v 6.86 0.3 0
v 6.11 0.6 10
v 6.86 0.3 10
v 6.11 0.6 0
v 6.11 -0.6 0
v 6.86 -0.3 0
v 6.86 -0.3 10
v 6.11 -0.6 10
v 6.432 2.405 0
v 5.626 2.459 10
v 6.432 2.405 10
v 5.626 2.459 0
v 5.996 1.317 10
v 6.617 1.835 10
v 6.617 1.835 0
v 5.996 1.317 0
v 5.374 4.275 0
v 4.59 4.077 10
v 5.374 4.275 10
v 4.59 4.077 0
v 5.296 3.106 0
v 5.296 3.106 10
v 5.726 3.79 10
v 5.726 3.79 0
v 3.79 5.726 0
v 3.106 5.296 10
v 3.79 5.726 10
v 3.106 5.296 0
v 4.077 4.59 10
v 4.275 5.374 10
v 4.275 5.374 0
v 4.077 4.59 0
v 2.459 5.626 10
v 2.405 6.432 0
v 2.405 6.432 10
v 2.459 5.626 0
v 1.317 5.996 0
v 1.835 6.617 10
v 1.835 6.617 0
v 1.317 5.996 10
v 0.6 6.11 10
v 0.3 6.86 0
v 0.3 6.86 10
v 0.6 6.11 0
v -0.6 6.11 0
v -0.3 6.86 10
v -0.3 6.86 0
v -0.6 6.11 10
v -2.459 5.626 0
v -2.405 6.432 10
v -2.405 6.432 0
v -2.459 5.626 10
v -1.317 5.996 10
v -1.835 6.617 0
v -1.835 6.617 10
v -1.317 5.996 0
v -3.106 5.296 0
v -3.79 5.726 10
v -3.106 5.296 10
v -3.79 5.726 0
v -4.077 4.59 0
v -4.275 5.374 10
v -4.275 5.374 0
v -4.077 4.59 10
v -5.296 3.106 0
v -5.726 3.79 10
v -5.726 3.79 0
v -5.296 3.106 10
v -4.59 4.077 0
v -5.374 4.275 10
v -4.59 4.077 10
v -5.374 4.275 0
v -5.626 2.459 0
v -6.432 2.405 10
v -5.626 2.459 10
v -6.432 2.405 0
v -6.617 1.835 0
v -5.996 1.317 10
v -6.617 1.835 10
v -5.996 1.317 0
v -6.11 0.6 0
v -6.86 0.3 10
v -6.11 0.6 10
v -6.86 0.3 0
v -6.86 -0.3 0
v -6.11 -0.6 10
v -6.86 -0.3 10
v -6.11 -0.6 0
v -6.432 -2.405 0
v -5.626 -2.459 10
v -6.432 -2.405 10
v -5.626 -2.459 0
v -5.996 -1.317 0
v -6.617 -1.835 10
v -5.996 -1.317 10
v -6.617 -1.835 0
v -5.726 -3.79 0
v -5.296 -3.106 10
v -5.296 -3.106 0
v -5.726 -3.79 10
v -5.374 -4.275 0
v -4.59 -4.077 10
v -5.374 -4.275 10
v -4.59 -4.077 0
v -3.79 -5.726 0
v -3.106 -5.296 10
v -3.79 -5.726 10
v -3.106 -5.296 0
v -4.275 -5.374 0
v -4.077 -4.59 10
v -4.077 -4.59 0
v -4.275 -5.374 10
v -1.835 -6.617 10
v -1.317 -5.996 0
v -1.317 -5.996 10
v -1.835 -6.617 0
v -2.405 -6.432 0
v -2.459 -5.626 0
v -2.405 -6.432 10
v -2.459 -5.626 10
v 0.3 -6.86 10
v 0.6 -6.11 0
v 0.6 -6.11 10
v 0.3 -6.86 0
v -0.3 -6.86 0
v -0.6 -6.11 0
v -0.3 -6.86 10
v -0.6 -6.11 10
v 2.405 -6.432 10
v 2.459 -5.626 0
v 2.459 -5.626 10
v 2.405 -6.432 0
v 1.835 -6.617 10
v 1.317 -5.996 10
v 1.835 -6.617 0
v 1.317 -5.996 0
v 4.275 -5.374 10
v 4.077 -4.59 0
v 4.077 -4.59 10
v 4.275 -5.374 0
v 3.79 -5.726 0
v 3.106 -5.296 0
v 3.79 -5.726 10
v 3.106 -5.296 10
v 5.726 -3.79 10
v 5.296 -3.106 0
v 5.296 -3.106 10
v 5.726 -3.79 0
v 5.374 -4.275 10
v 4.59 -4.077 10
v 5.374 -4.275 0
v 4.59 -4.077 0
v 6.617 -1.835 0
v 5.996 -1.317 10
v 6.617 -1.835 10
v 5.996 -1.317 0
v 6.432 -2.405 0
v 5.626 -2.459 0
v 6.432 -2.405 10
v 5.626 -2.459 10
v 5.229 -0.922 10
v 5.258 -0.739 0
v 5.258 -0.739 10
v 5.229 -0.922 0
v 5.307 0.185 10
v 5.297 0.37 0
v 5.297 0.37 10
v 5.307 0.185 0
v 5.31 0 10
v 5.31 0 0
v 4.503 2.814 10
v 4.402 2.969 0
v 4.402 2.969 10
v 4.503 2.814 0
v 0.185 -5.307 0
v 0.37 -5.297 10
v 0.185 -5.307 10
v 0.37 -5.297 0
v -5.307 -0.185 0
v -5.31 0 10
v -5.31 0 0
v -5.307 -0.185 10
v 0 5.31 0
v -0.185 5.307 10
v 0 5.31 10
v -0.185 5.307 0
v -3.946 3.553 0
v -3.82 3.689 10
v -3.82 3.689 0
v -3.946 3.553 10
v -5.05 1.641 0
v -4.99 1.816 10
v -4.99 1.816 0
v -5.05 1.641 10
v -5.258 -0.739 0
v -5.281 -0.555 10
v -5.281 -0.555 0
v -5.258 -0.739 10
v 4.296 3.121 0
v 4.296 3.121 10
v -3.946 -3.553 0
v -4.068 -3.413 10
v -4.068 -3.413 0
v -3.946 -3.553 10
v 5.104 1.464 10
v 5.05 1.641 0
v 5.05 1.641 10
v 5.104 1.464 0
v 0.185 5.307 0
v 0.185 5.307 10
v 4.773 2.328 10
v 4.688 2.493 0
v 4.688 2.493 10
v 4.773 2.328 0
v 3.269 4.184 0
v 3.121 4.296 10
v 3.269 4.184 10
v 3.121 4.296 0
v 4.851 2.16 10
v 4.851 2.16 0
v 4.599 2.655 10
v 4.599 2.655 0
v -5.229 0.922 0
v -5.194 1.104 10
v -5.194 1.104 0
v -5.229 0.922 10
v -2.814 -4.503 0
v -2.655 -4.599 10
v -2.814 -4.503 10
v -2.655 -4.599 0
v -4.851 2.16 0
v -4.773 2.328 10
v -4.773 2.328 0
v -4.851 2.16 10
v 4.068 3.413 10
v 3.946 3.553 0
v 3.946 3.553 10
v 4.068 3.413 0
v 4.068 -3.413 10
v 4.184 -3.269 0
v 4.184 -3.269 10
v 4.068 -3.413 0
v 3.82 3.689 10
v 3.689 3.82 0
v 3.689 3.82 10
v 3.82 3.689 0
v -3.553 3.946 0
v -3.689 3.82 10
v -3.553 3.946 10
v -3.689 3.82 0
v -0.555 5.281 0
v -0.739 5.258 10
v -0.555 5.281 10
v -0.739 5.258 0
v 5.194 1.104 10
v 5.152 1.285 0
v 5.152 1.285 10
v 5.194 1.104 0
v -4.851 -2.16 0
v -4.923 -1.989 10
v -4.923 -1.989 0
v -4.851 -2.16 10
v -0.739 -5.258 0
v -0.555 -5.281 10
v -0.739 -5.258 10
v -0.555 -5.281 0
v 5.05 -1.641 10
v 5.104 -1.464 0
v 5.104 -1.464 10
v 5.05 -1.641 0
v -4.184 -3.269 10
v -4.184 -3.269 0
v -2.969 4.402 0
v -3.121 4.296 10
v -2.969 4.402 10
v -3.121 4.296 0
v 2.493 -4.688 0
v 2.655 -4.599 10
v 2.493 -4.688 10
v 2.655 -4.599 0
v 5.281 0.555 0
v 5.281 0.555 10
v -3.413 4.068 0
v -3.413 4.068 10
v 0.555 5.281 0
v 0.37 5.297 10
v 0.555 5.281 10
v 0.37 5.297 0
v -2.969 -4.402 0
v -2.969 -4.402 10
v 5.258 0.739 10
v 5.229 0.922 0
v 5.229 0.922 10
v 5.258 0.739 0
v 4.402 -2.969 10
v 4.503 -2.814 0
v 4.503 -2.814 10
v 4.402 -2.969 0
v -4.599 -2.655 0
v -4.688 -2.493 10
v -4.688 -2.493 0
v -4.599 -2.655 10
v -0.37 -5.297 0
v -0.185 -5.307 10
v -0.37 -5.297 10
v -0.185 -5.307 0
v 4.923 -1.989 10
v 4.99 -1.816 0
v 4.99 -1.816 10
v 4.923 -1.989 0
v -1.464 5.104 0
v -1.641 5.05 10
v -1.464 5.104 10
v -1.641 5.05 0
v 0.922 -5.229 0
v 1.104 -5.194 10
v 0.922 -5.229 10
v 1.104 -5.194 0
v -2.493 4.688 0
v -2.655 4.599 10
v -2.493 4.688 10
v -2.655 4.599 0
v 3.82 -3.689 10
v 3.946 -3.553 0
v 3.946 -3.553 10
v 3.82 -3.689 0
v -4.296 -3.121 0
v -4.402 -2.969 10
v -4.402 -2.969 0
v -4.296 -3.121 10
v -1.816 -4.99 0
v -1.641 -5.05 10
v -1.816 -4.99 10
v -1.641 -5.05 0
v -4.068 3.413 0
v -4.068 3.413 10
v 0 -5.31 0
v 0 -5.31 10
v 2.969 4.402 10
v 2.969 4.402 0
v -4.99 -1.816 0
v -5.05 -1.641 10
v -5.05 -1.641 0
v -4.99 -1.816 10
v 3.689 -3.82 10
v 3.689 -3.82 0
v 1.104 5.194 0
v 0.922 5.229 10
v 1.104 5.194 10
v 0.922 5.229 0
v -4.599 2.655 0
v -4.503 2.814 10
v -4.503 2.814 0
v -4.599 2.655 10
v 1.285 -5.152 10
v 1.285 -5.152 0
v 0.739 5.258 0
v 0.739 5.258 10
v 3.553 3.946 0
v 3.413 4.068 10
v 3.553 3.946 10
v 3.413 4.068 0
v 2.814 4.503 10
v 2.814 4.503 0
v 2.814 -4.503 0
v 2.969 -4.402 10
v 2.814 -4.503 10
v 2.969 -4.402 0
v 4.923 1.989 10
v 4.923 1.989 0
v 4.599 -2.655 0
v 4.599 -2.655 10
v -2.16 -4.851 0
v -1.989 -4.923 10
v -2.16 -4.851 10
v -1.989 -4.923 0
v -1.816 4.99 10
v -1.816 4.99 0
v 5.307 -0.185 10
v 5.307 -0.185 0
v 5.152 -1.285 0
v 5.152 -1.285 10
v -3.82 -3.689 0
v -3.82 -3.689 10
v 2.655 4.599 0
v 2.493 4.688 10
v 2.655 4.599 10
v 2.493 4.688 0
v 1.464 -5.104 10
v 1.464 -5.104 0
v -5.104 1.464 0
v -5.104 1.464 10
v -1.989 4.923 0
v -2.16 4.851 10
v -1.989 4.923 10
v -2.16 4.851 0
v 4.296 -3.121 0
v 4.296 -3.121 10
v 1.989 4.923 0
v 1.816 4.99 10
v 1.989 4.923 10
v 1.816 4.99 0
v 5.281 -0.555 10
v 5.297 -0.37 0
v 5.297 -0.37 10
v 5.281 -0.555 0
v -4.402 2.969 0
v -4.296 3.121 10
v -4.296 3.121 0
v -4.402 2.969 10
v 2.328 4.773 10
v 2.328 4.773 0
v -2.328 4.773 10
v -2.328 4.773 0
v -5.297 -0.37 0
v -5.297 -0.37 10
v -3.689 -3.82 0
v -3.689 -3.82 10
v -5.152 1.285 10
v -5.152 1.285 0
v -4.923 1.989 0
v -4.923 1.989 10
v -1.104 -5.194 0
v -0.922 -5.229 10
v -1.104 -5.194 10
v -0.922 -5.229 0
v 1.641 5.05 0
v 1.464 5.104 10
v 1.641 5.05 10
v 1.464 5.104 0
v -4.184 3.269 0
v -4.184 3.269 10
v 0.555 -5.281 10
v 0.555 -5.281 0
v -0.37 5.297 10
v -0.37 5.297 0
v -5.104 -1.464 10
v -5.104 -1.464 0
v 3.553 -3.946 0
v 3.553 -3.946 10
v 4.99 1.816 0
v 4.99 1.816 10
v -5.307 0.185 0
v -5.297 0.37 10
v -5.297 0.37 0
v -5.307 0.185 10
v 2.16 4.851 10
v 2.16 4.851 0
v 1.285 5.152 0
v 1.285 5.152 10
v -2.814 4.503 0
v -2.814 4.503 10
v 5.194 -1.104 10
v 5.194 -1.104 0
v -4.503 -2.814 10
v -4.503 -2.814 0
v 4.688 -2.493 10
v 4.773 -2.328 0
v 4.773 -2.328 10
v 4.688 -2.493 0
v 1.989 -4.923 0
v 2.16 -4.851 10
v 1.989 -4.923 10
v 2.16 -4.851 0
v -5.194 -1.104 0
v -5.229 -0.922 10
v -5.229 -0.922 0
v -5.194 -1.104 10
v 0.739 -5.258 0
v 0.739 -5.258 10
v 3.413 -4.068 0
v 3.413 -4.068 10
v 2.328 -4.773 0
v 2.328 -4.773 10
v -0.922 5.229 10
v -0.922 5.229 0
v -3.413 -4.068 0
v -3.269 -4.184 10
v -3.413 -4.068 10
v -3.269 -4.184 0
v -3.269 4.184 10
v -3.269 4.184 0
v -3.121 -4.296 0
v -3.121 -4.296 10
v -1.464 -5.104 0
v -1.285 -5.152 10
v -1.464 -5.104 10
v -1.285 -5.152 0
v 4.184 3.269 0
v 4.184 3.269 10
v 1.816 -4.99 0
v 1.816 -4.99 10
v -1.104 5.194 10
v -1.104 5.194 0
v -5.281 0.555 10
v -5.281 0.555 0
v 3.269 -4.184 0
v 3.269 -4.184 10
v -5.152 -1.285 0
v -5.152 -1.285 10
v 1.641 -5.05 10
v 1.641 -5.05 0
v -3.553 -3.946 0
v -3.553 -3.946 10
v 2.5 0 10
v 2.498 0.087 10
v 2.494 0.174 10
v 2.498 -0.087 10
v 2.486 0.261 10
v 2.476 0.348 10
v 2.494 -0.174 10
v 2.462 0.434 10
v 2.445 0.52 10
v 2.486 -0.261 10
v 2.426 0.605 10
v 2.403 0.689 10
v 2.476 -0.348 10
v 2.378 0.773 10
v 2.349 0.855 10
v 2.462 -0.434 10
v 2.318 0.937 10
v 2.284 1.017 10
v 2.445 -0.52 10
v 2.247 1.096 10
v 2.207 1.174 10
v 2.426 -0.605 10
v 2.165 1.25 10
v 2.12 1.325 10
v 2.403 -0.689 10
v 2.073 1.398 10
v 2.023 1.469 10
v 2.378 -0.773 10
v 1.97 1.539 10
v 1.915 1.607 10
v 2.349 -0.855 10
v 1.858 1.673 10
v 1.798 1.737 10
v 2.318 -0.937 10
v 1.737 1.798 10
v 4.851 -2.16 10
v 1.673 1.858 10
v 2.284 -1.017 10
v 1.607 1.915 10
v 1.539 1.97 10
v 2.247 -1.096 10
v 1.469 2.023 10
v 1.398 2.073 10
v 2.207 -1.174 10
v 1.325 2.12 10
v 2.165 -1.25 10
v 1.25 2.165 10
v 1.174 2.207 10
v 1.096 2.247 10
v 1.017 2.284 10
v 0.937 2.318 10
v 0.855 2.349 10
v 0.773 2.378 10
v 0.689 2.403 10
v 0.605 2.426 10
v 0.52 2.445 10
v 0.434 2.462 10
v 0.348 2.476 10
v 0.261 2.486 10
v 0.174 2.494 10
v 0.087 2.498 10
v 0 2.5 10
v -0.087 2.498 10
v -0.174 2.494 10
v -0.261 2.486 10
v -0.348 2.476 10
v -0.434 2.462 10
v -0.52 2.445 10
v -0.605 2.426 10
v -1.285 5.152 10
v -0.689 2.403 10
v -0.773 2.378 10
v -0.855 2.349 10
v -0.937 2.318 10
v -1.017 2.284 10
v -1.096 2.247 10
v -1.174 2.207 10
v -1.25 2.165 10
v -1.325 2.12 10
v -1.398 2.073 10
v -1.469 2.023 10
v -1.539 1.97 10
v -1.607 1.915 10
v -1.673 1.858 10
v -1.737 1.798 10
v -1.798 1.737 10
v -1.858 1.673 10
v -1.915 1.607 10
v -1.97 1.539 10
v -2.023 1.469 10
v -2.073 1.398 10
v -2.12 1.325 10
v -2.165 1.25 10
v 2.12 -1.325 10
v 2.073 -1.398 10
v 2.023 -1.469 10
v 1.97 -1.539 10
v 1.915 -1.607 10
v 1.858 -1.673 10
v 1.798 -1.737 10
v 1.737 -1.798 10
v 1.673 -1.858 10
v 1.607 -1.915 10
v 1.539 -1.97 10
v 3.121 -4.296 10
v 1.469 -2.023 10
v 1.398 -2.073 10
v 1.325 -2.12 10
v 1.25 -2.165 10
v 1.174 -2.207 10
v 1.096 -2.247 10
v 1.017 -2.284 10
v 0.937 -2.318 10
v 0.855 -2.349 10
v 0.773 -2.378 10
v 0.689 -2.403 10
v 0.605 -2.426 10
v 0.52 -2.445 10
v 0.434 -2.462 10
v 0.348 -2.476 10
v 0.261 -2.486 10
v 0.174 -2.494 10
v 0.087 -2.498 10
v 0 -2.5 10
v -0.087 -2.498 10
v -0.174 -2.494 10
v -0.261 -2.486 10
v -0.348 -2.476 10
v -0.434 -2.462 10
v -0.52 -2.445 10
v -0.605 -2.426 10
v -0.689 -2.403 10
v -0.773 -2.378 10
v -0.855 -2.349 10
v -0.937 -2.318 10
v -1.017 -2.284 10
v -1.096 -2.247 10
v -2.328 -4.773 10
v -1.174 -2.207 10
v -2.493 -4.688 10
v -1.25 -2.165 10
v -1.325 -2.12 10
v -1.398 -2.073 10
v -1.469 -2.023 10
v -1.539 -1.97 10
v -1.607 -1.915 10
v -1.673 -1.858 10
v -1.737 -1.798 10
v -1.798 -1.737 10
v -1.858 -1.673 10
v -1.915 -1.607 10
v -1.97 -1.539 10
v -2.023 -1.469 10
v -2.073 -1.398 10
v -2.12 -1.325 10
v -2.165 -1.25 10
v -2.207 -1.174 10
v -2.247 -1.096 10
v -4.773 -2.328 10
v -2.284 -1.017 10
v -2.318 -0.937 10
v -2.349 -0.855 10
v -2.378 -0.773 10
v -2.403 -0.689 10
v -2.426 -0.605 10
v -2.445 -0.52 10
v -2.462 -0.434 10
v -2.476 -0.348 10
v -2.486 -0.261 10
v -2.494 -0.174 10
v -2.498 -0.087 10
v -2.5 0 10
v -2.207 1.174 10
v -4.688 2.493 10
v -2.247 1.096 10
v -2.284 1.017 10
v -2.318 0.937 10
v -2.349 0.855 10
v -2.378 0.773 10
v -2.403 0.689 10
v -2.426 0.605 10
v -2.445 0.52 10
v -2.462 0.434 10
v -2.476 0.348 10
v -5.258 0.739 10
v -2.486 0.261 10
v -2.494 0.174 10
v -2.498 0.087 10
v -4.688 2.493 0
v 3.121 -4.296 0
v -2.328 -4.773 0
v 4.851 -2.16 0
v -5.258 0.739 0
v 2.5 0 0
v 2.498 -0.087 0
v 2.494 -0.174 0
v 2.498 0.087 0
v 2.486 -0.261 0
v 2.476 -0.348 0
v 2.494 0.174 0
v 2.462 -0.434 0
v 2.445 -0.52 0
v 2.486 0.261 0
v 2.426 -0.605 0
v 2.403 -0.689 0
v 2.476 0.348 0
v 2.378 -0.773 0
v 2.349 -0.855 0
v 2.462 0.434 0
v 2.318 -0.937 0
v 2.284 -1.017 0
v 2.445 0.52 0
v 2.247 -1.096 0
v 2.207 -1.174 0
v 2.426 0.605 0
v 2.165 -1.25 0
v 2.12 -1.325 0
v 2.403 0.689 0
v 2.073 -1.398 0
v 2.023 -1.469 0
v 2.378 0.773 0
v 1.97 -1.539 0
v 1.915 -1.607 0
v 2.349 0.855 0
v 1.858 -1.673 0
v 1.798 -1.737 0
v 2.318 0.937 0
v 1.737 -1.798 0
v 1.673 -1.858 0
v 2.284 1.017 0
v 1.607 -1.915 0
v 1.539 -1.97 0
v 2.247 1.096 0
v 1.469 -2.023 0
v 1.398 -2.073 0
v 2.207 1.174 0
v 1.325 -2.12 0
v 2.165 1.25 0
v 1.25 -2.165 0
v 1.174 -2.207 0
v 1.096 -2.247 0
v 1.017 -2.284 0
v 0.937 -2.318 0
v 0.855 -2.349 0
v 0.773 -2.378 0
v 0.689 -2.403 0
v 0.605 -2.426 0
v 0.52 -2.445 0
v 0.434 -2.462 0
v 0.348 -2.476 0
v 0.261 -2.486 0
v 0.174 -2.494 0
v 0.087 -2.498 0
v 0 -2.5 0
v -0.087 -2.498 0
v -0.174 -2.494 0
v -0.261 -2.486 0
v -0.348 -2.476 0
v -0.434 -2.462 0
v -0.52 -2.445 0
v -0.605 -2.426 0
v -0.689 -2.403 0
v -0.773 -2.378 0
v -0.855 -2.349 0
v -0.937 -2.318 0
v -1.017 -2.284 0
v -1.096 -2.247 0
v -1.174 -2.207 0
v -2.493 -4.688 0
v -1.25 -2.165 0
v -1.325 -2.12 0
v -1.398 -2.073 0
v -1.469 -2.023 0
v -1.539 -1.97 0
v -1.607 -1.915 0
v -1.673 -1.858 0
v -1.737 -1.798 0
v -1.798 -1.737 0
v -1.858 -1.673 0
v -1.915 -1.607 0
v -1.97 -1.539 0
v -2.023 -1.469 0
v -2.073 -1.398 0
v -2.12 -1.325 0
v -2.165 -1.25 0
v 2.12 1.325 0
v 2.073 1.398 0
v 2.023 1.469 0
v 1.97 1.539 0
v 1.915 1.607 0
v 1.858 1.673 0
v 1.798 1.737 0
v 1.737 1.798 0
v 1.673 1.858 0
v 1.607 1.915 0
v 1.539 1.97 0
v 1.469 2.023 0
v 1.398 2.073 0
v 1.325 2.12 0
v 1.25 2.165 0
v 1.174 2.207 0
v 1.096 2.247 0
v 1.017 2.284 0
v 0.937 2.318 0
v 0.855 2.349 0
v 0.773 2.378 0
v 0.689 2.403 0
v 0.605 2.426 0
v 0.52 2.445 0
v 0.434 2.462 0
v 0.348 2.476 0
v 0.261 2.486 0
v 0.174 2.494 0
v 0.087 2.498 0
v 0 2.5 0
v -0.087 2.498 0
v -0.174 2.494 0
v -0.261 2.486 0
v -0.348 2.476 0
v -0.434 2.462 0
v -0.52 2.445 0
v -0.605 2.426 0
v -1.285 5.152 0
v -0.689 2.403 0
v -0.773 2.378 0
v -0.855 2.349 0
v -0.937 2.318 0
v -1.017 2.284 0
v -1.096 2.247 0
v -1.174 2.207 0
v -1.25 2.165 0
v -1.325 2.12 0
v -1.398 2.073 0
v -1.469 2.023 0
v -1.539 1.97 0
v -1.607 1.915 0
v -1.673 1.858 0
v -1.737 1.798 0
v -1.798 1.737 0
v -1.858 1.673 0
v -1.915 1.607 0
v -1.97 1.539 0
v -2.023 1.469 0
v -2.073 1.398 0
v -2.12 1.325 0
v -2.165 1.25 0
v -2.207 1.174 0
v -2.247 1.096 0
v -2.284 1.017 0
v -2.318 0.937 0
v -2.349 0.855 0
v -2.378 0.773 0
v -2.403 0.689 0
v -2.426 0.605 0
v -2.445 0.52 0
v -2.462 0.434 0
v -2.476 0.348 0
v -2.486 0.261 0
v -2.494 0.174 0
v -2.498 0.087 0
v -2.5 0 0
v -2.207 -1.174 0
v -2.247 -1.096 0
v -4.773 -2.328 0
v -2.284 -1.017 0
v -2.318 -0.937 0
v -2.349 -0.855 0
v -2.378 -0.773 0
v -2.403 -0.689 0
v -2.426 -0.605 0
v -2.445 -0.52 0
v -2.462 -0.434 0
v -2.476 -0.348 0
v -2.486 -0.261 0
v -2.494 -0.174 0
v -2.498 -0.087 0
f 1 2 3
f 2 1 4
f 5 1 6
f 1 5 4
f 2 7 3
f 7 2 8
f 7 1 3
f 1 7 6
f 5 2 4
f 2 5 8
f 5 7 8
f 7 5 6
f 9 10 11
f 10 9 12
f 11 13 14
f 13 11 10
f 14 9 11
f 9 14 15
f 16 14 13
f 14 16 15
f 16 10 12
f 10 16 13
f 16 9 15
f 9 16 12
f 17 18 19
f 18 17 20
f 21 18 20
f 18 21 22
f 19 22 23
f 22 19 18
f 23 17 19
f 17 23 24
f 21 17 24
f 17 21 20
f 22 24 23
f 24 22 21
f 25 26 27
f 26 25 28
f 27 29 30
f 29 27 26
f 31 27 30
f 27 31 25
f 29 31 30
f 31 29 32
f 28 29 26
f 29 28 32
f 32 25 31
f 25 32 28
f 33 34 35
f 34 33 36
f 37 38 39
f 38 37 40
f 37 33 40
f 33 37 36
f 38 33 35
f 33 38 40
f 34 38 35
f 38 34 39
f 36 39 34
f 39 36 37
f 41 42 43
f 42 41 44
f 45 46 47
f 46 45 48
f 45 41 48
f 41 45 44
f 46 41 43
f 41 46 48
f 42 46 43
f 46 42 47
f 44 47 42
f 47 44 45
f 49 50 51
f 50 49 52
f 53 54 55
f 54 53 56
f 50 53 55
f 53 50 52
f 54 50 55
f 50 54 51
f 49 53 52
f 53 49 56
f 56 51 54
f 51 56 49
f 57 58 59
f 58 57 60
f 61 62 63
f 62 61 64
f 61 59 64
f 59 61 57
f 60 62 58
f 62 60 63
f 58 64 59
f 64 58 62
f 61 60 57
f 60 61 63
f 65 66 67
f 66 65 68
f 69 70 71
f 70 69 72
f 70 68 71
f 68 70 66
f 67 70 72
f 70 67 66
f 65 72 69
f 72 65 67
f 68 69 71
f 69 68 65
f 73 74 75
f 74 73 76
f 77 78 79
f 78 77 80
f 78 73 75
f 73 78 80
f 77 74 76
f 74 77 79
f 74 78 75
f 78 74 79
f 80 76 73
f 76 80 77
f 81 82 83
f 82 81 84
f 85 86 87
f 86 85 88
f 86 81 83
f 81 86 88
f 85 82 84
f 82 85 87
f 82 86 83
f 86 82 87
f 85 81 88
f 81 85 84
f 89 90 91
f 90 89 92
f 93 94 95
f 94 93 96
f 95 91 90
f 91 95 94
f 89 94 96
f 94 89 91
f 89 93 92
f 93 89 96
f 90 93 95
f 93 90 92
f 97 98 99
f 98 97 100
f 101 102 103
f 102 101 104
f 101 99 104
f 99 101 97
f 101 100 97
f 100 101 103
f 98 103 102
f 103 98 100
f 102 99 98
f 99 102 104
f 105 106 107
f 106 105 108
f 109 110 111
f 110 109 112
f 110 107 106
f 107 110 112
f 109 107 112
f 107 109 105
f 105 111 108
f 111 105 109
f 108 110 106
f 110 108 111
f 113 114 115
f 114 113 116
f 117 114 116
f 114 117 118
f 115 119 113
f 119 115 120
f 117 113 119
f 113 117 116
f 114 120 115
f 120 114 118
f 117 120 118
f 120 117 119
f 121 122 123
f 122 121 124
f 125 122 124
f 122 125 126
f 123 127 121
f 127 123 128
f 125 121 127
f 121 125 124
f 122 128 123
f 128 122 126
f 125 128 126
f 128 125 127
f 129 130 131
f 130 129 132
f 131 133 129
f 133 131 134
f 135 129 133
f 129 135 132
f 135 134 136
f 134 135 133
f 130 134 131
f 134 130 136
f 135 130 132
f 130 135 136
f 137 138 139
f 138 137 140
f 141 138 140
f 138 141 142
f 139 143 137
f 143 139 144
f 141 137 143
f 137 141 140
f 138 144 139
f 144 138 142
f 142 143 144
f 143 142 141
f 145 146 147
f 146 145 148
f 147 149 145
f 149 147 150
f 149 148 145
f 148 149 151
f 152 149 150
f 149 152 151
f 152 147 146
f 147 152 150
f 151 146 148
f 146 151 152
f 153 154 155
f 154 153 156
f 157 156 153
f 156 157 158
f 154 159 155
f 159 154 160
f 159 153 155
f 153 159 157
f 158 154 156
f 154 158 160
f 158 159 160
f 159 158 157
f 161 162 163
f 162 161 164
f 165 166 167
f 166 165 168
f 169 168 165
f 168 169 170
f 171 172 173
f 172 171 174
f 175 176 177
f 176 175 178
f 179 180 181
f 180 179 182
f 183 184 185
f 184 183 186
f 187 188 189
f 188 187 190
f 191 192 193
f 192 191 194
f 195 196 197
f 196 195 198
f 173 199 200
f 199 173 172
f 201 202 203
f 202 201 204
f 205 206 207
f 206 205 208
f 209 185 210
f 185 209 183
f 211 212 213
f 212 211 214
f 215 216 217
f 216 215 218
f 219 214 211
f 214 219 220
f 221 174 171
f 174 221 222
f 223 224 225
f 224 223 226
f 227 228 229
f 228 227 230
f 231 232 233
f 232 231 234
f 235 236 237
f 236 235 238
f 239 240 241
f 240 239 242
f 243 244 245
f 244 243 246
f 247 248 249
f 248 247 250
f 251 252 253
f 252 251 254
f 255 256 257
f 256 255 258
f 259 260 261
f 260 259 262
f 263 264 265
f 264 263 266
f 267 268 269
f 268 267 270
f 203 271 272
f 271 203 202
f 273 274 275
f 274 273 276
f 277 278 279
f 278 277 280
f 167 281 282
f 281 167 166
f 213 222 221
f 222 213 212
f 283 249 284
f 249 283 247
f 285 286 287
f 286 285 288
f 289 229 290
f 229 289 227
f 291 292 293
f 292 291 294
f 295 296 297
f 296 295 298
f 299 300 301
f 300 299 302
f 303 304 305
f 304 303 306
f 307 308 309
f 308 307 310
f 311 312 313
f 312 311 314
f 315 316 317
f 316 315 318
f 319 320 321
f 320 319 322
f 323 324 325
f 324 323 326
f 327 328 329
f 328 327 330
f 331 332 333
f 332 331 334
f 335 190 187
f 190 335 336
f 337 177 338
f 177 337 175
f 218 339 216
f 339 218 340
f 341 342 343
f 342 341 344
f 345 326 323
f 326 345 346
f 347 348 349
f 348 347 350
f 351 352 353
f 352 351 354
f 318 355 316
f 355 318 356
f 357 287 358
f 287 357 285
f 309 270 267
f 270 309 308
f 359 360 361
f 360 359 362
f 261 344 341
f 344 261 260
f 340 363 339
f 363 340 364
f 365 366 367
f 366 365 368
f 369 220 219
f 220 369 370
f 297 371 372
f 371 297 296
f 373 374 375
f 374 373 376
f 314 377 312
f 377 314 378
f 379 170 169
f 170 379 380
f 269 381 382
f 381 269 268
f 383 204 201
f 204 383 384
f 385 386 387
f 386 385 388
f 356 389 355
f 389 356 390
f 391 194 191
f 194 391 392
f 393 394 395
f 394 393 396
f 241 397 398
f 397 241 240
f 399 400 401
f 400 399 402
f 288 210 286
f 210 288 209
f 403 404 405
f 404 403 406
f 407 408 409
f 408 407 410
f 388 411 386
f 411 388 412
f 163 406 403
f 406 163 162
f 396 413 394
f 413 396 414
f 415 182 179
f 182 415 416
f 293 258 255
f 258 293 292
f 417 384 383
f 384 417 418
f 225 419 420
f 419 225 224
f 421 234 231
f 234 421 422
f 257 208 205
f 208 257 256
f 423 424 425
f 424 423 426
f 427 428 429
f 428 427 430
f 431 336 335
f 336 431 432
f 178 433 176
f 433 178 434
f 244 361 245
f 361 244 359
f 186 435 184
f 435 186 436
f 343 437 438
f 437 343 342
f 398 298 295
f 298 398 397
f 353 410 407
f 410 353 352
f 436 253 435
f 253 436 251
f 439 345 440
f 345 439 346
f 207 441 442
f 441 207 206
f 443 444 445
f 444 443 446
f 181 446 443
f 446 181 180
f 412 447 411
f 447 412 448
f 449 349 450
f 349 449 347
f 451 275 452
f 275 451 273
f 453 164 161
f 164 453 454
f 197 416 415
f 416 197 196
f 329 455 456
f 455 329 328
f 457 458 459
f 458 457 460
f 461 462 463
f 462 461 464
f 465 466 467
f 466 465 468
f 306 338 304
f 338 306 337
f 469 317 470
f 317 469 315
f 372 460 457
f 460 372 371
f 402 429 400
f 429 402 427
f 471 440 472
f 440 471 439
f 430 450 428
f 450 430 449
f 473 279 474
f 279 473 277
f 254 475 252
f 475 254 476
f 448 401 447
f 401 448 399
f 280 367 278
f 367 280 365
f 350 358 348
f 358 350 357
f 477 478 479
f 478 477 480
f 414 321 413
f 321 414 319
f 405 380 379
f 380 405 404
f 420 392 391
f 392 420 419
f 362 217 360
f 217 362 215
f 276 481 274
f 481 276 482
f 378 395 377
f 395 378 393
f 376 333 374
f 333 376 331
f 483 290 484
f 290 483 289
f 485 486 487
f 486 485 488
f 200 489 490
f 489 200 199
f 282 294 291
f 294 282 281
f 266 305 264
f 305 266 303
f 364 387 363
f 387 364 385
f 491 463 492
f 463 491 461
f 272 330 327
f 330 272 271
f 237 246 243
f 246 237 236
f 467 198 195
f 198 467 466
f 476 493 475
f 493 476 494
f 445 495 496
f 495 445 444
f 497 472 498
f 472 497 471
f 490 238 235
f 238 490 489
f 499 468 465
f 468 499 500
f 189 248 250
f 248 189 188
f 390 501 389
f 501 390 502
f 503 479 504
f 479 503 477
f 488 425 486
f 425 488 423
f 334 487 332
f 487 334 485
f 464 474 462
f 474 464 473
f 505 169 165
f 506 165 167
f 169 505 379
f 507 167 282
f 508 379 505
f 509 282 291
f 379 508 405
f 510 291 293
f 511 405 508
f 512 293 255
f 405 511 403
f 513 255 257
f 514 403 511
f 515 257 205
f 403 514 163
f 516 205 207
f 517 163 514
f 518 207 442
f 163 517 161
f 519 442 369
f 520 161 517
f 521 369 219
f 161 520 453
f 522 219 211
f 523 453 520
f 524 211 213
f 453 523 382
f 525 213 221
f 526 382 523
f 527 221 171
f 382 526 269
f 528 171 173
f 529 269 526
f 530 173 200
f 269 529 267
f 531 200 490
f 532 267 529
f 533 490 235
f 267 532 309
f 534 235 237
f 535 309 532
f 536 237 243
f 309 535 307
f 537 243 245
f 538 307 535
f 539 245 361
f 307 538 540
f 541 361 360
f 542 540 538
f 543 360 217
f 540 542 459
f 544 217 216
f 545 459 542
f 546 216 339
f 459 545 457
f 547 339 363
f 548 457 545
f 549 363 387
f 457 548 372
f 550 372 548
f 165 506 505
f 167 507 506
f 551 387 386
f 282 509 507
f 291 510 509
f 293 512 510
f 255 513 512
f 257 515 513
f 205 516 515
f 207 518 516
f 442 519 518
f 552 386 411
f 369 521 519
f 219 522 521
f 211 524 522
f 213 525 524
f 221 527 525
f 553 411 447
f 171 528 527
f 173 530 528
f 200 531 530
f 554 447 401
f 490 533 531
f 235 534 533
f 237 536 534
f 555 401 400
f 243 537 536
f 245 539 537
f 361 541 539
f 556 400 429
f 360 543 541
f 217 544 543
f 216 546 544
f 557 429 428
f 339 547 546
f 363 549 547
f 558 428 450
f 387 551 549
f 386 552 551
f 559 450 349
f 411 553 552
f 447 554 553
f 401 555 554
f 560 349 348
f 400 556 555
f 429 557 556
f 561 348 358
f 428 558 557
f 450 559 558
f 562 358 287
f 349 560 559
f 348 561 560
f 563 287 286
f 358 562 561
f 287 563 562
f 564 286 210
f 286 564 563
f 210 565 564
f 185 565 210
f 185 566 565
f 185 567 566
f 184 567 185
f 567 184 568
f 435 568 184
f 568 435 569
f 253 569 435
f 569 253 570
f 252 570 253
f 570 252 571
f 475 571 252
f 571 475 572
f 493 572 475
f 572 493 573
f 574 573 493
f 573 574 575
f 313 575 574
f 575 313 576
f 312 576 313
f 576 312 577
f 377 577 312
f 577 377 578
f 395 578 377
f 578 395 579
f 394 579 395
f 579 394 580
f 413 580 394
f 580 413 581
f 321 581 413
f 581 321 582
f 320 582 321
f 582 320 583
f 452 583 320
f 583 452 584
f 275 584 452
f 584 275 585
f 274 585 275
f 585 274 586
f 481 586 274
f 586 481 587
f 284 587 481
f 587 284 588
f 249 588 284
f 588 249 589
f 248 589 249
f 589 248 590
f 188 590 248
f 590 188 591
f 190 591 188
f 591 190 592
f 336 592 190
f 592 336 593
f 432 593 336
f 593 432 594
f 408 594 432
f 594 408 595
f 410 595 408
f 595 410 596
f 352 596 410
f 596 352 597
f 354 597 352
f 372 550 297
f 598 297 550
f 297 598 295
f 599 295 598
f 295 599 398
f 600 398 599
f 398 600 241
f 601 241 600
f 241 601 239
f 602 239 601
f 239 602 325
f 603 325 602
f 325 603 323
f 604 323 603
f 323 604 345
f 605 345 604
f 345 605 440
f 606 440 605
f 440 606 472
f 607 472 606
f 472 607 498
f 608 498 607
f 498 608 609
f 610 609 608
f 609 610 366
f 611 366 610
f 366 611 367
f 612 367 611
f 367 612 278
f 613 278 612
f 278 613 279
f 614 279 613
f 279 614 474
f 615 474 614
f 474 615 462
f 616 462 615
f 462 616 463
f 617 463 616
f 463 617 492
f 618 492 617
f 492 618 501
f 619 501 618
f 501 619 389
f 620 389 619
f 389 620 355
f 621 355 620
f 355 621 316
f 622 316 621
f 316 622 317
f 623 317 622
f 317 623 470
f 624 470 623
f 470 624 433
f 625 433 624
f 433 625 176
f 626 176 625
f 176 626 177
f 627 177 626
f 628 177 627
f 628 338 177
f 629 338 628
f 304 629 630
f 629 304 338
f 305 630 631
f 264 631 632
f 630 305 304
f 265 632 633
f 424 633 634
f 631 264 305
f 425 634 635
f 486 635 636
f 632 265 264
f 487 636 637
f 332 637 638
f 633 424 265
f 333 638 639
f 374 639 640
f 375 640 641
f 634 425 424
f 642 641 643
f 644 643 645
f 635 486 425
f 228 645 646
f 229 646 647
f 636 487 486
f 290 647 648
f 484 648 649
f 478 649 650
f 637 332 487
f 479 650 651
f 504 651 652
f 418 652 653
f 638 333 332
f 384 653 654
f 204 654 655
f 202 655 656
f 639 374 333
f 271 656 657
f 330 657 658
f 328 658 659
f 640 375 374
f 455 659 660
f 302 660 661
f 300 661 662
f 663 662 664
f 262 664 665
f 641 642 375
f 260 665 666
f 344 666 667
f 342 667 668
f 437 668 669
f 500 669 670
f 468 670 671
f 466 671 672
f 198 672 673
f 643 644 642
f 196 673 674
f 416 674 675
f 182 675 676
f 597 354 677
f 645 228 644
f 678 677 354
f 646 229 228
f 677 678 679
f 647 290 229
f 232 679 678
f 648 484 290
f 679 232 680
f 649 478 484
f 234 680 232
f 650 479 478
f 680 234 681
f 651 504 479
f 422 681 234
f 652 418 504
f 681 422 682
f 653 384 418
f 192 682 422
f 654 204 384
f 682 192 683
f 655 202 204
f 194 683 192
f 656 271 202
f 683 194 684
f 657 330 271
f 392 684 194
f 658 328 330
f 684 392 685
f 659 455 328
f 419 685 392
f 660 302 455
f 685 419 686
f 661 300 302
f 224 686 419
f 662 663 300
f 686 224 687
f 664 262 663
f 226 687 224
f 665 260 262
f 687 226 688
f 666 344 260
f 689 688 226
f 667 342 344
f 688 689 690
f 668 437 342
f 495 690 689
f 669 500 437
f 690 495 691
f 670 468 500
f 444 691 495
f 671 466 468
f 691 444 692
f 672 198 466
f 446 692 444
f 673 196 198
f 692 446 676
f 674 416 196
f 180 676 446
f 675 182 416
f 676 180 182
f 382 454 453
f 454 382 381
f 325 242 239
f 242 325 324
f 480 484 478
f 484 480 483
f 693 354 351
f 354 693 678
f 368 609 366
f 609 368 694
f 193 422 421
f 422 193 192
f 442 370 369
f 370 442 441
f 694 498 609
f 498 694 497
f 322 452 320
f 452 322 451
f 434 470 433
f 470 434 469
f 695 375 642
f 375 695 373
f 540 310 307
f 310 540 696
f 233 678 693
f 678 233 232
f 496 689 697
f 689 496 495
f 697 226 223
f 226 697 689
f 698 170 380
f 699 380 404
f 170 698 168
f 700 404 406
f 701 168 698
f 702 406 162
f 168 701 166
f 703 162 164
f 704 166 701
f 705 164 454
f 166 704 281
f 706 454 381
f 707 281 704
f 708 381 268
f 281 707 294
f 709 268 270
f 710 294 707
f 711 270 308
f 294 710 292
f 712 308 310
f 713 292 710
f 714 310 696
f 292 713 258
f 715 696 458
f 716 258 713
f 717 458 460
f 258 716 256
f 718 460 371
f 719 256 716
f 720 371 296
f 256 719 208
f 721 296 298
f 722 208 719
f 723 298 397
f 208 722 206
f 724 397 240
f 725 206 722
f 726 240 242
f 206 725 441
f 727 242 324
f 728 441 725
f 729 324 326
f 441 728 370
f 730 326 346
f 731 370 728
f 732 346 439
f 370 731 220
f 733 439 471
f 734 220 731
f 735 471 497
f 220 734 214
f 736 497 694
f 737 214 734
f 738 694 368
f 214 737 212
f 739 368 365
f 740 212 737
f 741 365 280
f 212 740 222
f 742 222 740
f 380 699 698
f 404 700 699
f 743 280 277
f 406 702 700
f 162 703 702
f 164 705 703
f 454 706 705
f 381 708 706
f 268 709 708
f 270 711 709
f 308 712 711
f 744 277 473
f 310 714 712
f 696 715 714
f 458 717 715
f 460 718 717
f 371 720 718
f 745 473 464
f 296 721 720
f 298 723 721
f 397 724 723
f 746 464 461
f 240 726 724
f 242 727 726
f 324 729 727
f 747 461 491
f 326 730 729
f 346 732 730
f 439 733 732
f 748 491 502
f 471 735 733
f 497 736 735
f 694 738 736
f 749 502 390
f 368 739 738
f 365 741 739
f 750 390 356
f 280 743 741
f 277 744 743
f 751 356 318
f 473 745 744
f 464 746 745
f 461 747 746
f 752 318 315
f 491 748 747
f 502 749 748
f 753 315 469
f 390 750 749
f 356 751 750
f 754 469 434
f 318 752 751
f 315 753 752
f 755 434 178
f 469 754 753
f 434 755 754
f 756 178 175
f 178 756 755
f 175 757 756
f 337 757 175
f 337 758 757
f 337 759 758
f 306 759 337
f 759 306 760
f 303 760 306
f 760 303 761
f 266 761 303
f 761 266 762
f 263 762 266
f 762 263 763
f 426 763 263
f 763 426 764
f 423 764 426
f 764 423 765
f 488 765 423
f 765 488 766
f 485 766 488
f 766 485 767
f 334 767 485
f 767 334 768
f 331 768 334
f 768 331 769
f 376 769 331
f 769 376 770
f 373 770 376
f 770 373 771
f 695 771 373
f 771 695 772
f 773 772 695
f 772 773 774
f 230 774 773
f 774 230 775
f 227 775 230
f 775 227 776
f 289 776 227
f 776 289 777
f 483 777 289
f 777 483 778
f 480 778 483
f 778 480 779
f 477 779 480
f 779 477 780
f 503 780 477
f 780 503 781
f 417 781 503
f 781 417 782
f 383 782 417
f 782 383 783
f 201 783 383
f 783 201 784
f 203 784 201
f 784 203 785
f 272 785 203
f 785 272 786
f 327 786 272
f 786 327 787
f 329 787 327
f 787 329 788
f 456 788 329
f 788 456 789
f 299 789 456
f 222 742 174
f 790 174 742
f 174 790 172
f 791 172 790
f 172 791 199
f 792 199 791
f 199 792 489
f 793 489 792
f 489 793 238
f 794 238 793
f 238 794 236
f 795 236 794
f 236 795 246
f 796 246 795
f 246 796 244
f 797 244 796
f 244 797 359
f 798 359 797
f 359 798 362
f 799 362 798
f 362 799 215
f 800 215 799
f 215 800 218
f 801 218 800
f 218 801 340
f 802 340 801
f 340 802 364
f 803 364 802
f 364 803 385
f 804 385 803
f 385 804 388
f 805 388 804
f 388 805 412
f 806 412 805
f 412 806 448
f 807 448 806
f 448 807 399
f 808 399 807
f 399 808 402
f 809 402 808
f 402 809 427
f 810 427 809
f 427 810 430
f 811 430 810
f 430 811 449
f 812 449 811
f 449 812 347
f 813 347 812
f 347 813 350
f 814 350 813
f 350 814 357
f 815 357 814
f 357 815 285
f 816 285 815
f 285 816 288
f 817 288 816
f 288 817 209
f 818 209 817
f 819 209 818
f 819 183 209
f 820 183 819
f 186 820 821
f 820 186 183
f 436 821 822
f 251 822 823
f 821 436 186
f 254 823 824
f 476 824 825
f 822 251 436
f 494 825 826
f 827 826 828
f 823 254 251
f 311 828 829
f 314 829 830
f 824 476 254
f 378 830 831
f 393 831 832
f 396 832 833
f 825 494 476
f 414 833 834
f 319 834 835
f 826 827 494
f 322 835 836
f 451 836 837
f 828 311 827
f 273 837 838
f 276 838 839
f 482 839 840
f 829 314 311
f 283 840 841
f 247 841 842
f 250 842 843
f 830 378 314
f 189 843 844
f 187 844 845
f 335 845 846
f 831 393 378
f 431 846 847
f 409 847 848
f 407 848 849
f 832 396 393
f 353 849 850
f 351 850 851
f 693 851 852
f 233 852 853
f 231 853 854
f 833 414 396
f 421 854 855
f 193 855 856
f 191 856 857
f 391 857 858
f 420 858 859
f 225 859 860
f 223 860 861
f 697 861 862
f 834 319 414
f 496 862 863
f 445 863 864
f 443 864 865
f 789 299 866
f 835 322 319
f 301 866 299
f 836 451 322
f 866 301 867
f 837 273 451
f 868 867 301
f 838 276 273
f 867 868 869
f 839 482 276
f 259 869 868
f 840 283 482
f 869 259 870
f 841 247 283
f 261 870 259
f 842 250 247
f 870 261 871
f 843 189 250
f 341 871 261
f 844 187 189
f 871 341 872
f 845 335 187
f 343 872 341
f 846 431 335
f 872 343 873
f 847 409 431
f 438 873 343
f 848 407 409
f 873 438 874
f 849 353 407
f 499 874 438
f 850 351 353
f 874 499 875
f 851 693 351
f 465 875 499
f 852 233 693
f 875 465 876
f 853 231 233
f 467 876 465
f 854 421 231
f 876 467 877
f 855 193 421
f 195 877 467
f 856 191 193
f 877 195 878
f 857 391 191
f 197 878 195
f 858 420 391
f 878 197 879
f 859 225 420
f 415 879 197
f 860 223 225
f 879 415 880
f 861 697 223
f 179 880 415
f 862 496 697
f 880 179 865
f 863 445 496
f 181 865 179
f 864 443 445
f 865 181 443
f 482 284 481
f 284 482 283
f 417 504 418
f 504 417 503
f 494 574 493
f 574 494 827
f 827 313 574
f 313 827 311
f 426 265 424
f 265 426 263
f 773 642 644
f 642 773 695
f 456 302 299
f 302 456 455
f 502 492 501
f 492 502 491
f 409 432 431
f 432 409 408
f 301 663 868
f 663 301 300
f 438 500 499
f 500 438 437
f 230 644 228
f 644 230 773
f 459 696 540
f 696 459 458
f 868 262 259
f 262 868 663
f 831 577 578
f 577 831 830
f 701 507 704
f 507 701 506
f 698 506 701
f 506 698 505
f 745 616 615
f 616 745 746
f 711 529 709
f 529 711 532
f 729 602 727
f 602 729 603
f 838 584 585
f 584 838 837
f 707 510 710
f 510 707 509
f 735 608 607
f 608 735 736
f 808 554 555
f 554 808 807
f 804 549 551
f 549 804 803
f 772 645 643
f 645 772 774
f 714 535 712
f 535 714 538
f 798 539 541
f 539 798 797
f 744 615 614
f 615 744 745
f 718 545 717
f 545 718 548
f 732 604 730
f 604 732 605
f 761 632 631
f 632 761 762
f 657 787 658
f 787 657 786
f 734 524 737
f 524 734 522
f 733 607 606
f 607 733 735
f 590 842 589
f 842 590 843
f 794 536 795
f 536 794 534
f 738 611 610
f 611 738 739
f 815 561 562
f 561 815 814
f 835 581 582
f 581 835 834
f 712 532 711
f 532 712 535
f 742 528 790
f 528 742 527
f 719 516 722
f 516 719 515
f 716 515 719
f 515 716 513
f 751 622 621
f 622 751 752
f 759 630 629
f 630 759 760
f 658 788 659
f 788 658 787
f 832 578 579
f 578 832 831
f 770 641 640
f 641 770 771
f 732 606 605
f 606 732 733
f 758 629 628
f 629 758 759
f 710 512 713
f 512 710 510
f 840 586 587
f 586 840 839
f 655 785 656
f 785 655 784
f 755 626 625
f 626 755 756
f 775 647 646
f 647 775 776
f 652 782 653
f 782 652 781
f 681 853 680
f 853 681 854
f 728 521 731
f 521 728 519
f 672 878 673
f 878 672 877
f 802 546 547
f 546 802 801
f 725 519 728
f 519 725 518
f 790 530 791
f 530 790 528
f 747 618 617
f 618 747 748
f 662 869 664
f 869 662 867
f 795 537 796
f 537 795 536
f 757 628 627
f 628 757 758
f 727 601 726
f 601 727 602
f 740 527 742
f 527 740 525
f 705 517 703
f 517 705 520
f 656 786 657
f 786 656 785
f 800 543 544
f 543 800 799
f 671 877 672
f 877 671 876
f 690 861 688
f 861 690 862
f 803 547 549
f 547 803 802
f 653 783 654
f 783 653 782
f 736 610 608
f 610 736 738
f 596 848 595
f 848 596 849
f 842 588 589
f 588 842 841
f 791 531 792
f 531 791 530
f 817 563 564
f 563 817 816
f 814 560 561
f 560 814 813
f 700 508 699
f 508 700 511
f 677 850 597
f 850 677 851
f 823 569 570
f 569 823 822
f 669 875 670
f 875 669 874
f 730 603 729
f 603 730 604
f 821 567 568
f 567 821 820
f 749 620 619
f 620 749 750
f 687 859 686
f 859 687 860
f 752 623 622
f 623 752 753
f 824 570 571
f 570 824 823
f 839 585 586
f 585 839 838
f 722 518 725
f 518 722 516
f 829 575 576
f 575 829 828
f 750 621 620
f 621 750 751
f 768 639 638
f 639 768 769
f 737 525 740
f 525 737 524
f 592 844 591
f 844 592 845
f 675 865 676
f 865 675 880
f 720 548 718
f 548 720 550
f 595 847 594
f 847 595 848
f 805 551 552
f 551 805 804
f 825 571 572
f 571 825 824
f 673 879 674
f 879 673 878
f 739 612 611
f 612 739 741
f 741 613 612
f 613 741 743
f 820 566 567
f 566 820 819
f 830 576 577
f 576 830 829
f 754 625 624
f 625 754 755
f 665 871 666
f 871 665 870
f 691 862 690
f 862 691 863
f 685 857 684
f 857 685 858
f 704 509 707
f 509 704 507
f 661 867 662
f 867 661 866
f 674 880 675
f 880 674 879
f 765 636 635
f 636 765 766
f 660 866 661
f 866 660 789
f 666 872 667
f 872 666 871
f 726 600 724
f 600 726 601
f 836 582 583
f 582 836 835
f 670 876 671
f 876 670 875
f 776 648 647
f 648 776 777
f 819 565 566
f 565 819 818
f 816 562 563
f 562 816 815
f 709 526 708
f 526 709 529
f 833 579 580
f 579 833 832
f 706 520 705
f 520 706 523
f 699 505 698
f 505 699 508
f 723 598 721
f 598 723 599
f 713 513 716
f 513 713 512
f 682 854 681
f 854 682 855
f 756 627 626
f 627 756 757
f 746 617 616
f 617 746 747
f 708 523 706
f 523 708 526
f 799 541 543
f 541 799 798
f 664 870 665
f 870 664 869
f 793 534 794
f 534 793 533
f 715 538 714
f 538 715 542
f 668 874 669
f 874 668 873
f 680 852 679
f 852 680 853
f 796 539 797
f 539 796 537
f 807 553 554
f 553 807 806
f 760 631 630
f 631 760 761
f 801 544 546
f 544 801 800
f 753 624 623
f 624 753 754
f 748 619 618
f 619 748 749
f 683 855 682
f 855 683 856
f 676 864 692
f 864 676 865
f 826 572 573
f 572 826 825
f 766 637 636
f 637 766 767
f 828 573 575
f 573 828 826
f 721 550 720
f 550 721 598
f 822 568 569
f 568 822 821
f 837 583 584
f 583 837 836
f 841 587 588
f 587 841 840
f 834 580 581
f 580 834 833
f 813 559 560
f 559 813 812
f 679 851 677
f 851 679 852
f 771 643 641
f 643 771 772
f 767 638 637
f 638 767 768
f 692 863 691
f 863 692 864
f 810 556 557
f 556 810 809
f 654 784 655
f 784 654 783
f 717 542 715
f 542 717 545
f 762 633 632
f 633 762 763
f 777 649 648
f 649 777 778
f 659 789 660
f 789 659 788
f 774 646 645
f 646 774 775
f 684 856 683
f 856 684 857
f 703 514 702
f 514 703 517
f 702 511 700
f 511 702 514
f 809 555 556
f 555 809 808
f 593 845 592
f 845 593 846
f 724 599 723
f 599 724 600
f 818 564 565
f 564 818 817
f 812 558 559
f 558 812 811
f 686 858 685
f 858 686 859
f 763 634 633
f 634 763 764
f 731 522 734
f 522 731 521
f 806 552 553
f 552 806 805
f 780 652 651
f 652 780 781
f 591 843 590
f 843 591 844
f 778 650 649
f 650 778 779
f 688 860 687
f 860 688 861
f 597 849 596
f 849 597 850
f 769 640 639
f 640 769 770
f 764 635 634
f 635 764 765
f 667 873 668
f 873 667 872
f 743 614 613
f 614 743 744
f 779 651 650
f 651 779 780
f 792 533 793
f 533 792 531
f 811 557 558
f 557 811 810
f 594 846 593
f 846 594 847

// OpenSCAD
$fn = 180;

// Timing pulley (simplified GT2-like tooth form)
// User specs:
teeth = 20;
pitch_diameter = 12.22;   // mm

// Assumptions / defaults (can be edited):
pitch = PI * pitch_diameter / teeth;  // derived from pitch diameter & tooth count
pulley_width = 10;        // mm
bore_diameter = 5;        // mm
hub_diameter = 0;         // 0 = no hub
hub_width = 0;            // mm

// Tooth geometry (simplified trapezoid approximation):
tooth_height = 0.75;      // mm (radial)
tooth_top_width = 0.60;   // mm (at outer radius)
tooth_root_width = 1.20;  // mm (at pitch radius)

// Body thickness below pitch circle (to give a root cylinder):
root_extra = 0.80;        // mm (radial below pitch radius)

// Small clearance to avoid coincident faces:
eps = 0.01;

module timing_pulley(teeth, pitch_diameter, width, bore_d, hub_d=0, hub_w=0) {
    pitch_r = pitch_diameter/2;
    root_r  = max(0.1, pitch_r - root_extra);
    outer_r = pitch_r + tooth_height;

    difference() {
        union() {
            // Root cylinder
            cylinder(h=width, r=root_r);

            // Teeth
            for (i = [0:teeth-1]) {
                rotate([0,0, i*360/teeth])
                    translate([pitch_r, 0, 0])
                        tooth(width, tooth_root_width, tooth_top_width, tooth_height);
            }

            // Optional hub
            if (hub_d > 0 && hub_w > 0) {
                translate([0,0,(width-hub_w)/2])
                    cylinder(h=hub_w, r=hub_d/2);
            }
        }

        // Bore
        translate([0,0,-eps])
            cylinder(h=width + 2*eps, r=bore_d/2);
    }
}

module tooth(width, w_root, w_top, h) {
    // Trapezoid in XY, extruded along Z
    linear_extrude(height=width, center=false, convexity=10)
        polygon(points=[
            [0, -w_root/2],
            [0,  w_root/2],
            [h,  w_top/2],
            [h, -w_top/2]
        ]);
}

timing_pulley(teeth=teeth, pitch_diameter=pitch_diameter, width=pulley_width, bore_d=bore_diameter, hub_d=hub_diameter, hub_w=hub_width);
